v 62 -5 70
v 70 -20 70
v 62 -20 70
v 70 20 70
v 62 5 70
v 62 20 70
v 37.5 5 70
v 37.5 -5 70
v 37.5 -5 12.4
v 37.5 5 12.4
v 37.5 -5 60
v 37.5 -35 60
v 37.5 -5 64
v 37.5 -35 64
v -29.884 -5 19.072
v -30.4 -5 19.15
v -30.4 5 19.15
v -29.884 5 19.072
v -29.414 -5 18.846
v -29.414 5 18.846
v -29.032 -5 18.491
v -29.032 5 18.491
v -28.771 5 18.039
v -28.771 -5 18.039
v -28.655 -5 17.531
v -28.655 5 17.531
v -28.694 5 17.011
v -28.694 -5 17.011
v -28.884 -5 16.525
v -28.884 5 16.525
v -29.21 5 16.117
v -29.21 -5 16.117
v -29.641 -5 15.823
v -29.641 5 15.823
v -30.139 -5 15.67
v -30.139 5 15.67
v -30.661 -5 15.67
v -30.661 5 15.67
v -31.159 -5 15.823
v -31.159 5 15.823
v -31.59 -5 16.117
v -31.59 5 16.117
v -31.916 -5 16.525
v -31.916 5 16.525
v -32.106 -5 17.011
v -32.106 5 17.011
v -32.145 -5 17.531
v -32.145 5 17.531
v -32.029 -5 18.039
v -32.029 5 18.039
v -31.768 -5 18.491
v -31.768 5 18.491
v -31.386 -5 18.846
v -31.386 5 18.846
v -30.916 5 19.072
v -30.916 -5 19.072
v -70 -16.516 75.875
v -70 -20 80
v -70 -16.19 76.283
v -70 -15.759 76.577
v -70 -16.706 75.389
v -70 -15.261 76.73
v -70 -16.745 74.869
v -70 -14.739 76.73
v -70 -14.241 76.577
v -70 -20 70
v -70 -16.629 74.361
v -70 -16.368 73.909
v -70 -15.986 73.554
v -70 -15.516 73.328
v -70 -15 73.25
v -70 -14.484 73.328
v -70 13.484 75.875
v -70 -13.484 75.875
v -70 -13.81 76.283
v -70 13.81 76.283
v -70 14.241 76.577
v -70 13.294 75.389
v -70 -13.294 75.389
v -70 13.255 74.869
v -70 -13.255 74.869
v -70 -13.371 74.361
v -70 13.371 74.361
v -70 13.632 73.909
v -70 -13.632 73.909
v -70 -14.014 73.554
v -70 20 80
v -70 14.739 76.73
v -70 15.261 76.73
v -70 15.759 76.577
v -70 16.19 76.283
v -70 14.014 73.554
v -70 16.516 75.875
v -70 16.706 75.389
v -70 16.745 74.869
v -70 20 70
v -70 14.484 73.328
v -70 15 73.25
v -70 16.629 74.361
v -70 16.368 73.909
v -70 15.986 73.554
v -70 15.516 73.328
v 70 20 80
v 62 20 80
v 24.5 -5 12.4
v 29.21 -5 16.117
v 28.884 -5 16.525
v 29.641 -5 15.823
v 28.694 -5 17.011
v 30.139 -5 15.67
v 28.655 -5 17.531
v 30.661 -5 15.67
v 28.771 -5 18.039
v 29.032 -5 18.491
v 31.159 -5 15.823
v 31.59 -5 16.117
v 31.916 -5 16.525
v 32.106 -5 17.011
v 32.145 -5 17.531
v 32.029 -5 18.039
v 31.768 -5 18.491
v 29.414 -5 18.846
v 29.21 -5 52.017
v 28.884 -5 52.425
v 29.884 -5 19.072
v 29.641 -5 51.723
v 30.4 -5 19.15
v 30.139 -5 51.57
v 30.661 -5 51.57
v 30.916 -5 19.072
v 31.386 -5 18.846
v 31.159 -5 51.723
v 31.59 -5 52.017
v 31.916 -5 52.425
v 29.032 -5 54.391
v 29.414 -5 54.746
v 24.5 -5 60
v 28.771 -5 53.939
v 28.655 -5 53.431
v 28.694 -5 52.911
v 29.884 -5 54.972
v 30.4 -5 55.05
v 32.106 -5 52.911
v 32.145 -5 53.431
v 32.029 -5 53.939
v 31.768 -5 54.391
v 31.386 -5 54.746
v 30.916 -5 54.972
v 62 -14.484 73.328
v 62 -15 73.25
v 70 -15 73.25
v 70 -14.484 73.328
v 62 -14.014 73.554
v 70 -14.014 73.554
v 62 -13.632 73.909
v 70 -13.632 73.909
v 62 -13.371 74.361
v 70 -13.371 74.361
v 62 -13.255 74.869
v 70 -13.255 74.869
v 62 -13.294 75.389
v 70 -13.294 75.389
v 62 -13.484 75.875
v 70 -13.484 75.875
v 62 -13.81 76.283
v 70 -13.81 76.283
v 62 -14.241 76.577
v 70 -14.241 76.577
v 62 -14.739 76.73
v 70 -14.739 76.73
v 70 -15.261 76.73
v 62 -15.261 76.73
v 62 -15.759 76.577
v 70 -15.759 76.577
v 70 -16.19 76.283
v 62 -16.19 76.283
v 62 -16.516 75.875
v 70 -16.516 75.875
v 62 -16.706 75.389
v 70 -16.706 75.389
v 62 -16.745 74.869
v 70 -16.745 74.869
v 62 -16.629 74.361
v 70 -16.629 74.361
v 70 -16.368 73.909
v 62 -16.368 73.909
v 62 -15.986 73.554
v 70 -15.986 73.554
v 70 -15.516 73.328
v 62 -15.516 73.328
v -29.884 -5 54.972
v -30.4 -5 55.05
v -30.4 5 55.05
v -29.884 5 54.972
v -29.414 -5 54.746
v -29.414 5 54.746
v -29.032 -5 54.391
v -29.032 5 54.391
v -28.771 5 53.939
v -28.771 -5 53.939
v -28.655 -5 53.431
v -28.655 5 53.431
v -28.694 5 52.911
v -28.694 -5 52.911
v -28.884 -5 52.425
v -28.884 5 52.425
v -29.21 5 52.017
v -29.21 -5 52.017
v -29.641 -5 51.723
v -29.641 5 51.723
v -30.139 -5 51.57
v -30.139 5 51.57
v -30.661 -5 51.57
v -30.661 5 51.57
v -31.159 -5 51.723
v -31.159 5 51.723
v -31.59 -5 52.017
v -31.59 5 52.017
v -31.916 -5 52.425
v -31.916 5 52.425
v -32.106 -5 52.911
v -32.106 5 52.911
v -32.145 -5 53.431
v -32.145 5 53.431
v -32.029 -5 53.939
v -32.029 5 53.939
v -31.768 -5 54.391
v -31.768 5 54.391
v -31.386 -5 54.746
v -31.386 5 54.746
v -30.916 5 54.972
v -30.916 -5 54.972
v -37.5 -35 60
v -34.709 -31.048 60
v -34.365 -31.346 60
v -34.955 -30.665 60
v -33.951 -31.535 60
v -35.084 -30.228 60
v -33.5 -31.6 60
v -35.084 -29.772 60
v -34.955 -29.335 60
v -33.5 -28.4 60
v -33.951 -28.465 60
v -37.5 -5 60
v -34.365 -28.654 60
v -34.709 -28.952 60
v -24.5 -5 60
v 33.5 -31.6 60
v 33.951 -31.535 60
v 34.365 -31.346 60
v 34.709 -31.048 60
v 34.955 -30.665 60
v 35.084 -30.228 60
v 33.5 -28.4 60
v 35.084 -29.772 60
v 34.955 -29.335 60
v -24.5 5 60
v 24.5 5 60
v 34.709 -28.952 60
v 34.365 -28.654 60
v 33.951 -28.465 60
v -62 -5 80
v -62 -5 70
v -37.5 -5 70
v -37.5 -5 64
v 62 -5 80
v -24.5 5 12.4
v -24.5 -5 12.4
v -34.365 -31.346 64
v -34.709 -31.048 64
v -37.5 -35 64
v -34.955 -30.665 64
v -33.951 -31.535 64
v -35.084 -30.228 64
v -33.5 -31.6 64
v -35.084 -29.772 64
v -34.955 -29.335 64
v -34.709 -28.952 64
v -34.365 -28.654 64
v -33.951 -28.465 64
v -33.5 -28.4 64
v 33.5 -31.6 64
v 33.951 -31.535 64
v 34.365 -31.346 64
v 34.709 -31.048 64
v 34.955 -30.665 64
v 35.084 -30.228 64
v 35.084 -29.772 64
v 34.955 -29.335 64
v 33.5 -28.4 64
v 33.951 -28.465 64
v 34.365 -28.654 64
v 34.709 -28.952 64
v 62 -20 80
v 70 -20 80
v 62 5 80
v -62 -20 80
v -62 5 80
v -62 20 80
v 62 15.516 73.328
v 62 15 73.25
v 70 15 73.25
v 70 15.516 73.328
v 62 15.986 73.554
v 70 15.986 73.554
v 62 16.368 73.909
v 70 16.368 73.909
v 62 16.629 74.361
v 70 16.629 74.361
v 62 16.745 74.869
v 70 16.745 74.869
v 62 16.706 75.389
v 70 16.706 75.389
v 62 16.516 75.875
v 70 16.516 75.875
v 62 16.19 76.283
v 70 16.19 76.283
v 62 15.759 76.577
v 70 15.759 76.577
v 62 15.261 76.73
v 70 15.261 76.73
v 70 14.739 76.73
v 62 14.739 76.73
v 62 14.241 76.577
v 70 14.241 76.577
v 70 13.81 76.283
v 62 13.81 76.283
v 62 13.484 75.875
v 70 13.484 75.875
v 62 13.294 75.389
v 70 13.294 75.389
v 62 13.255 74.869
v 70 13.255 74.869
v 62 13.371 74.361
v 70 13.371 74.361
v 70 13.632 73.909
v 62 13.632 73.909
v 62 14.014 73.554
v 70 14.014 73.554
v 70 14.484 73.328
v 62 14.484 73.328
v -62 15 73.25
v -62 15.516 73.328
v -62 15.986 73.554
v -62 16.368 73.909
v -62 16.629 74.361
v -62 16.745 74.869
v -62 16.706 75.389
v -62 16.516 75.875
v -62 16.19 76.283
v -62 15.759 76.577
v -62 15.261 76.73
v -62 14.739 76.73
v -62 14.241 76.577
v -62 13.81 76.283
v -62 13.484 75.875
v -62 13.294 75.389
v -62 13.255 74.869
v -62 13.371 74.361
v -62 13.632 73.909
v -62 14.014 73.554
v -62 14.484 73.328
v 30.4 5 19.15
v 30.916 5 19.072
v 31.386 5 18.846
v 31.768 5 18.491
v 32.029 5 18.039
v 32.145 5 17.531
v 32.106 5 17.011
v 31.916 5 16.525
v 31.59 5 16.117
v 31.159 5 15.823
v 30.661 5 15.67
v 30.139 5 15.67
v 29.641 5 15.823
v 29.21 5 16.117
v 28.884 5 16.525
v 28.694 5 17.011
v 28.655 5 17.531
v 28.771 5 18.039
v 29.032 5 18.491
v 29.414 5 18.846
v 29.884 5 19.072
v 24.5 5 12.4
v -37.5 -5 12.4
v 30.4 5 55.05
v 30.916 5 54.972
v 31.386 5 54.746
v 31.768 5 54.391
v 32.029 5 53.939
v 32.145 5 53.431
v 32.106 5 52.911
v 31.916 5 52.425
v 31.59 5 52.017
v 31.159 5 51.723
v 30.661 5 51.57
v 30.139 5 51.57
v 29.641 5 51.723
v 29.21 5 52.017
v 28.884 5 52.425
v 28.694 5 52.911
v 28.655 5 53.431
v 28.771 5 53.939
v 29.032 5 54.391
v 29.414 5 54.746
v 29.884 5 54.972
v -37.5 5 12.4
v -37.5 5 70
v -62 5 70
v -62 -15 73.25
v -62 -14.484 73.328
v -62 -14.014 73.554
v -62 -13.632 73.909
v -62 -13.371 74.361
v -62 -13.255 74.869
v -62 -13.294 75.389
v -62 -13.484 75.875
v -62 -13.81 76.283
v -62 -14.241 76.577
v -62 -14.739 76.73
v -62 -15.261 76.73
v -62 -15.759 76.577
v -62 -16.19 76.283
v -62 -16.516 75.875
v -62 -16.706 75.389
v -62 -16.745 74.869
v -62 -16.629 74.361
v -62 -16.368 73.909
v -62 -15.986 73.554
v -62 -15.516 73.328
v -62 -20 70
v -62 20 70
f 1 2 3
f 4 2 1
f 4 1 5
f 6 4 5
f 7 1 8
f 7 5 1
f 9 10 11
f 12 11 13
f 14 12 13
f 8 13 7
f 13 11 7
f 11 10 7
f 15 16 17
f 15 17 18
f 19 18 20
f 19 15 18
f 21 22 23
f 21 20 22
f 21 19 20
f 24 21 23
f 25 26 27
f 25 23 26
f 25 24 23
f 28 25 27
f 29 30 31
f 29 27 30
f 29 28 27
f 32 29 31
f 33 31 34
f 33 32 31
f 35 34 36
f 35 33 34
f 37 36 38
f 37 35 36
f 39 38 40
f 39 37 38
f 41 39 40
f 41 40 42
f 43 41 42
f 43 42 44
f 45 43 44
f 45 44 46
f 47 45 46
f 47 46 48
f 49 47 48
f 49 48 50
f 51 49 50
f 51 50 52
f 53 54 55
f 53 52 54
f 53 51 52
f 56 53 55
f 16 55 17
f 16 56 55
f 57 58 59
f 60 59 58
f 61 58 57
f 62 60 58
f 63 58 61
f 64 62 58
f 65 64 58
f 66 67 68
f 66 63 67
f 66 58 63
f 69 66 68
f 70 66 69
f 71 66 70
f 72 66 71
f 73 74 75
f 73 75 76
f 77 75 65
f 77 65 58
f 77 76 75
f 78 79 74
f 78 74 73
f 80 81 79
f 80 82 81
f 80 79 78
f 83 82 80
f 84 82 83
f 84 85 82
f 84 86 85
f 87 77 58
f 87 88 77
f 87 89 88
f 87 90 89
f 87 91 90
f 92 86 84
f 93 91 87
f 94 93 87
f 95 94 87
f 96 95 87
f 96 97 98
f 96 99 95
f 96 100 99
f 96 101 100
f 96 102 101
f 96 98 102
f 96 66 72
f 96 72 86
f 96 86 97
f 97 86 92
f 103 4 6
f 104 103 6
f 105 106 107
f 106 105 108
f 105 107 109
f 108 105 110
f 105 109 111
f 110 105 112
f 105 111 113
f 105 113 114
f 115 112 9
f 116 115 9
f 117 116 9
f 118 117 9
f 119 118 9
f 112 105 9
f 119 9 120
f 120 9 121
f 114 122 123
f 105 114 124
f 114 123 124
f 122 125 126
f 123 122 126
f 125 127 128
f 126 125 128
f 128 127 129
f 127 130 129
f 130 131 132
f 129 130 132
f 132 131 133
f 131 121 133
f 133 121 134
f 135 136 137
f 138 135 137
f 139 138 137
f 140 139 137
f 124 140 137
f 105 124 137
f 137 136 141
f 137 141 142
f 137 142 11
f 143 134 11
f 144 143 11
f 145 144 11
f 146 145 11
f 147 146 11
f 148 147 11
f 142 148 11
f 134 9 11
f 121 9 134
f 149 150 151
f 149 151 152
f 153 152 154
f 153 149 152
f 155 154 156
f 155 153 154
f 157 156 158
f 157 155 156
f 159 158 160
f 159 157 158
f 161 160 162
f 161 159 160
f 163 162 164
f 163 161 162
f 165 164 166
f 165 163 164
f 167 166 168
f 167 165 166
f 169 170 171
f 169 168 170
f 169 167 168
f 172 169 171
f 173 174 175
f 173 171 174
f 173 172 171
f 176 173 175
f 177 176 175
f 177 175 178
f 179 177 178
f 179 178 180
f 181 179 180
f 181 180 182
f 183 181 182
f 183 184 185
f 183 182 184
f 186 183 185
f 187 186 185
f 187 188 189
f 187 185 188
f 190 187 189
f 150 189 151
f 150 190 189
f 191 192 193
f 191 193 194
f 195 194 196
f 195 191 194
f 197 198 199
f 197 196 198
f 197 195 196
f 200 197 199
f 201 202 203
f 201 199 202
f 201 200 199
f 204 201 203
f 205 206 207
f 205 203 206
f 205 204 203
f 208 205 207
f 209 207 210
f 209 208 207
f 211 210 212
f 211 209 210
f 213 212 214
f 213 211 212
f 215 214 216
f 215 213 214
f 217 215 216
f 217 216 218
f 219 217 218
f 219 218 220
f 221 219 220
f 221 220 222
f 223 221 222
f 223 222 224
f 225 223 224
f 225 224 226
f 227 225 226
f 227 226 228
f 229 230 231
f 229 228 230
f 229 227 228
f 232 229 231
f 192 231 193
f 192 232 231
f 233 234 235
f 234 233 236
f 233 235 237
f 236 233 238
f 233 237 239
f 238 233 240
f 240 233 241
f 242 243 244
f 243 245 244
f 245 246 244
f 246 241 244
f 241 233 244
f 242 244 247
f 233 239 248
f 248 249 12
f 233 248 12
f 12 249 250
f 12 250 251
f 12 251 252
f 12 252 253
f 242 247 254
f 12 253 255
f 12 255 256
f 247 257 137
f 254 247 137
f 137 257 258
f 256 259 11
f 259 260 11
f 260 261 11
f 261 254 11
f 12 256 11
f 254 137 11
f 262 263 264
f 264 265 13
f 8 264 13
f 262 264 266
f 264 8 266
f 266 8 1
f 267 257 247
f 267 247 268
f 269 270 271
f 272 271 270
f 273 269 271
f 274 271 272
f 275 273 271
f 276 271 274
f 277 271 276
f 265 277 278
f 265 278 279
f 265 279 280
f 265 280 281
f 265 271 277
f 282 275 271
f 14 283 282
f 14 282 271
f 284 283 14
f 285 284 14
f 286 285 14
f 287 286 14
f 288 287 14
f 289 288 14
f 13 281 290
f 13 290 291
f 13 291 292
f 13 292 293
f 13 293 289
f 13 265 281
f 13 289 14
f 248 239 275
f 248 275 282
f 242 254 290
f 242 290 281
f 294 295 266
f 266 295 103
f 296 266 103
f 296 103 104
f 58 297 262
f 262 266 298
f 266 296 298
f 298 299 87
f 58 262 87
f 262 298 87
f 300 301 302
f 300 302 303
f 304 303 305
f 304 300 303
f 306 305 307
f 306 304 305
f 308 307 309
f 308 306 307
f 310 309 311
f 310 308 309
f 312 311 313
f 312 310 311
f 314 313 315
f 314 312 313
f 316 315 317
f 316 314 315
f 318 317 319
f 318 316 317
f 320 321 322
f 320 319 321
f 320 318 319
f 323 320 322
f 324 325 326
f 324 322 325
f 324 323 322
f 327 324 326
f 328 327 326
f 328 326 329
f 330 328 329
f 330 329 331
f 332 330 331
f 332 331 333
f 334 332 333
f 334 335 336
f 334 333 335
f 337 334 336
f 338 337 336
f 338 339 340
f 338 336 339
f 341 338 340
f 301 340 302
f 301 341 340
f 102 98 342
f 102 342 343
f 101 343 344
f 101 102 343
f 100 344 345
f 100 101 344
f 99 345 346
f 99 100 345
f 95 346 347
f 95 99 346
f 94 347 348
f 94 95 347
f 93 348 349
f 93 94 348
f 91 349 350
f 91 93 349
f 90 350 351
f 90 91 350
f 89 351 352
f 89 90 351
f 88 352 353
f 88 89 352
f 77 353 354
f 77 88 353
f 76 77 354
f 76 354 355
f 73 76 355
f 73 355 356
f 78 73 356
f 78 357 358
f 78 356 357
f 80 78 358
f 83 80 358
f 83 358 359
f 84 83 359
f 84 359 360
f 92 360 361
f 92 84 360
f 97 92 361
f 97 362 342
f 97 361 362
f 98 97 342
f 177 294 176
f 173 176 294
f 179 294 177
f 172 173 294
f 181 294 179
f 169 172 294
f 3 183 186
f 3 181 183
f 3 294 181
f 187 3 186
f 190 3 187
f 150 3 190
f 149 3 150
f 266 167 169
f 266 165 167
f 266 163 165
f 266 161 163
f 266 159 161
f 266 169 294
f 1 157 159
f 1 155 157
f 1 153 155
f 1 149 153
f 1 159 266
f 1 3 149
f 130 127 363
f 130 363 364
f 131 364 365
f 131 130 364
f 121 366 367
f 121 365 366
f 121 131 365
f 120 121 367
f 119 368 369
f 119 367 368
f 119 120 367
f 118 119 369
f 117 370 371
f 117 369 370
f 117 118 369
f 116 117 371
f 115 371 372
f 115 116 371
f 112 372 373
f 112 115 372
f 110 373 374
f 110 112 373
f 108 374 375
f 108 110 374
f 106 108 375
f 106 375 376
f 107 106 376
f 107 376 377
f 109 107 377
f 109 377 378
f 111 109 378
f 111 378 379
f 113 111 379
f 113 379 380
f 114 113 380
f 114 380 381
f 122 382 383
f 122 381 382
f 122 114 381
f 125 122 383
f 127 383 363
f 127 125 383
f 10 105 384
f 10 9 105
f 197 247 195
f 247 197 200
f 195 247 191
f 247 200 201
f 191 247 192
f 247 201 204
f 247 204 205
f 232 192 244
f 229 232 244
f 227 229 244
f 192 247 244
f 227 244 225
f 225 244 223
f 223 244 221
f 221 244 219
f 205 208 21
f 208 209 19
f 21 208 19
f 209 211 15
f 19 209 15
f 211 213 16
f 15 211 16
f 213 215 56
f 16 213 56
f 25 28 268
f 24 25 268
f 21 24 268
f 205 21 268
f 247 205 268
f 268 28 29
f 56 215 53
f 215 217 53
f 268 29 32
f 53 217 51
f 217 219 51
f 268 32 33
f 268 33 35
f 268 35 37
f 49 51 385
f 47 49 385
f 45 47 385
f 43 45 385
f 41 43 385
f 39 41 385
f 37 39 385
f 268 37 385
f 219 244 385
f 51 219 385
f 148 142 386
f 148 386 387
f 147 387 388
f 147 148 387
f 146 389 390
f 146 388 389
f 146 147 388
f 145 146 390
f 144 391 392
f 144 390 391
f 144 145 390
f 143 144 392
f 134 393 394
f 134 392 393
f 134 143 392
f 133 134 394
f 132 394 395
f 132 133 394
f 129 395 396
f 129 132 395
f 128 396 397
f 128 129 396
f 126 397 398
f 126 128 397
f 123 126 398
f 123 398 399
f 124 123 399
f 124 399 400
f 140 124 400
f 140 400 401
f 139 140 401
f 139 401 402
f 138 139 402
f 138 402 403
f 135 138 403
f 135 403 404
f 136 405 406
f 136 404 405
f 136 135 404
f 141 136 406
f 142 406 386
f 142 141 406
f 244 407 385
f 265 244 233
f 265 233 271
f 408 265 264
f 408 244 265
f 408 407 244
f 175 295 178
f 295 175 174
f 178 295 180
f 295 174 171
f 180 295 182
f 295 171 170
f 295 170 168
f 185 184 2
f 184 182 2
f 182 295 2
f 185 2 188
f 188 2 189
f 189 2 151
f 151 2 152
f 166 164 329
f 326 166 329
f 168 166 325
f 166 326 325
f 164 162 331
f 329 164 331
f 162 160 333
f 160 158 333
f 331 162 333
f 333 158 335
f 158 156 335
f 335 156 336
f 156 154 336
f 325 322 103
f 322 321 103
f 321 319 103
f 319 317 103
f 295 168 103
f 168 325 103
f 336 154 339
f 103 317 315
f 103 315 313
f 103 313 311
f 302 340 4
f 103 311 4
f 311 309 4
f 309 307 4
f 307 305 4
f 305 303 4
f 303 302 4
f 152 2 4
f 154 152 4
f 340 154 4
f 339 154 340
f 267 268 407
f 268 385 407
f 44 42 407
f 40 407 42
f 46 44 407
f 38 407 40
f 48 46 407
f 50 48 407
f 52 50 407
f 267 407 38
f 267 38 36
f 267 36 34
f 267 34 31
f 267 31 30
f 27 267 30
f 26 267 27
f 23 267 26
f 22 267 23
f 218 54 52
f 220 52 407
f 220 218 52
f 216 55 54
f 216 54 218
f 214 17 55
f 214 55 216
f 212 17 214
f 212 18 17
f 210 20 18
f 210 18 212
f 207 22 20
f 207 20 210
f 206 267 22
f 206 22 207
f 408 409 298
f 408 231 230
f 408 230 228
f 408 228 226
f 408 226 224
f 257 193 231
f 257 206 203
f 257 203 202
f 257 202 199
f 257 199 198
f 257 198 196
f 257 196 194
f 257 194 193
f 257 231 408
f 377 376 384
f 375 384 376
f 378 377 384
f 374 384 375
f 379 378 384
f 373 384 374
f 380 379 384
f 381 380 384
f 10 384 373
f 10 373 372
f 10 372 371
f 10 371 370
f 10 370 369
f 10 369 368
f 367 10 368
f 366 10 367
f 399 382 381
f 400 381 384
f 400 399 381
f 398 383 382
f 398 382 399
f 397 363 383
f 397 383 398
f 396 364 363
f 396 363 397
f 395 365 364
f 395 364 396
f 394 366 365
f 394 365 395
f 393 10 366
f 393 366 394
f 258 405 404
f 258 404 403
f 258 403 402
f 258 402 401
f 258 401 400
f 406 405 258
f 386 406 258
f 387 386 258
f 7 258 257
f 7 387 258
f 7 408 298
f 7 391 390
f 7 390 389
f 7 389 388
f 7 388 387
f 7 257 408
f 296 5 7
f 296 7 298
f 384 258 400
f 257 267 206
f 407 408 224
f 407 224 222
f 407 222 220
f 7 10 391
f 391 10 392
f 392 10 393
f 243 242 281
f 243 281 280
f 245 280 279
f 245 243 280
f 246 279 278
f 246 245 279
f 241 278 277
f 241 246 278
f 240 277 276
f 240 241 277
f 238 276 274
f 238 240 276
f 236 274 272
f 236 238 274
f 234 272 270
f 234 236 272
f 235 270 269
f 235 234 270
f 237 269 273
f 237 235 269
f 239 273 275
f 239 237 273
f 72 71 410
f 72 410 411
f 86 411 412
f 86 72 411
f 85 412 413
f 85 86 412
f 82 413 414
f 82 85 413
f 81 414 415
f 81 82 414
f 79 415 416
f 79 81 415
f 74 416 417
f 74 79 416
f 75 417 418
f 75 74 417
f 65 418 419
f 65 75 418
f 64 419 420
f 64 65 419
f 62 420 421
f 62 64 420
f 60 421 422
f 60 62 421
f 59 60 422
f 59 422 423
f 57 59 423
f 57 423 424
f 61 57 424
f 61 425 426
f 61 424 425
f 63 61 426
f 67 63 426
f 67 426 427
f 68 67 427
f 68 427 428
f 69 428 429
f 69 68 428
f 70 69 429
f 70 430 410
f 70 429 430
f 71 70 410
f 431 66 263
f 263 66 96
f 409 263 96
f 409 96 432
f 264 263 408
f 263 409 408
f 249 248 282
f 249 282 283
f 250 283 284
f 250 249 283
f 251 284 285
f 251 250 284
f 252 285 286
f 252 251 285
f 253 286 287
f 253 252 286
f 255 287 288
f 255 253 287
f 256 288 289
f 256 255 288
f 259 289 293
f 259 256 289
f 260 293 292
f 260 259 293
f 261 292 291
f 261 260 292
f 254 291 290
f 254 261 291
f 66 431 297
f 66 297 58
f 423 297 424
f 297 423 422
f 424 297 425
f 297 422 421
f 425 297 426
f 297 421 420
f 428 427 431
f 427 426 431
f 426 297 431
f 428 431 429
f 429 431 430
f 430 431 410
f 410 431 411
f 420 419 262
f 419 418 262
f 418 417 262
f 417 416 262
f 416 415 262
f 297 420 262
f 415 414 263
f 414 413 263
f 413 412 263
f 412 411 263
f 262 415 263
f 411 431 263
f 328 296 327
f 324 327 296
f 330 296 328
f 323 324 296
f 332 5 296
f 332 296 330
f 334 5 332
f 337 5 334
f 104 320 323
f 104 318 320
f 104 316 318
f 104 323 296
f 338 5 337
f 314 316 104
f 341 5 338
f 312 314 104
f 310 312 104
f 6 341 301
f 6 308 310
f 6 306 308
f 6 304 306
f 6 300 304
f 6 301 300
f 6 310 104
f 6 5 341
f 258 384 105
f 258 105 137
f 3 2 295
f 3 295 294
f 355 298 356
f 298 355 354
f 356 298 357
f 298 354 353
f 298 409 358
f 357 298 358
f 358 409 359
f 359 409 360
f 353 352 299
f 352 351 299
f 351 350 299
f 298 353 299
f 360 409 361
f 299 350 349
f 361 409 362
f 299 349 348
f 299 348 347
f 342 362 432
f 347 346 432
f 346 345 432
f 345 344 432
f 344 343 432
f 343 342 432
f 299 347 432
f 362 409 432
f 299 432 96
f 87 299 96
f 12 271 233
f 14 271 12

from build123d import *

# Parameters (mm, degrees)
SKETCH_1_W               = 140
SKETCH_1_H               = 10
EXTRUDE_1_DEPTH          = 80
SKETCH_2_W               = 32.5
SKETCH_2_H               = 70
CUT_EXTRUDE_1_DEPTH      = 107.77078252
SKETCH_4_W               = 55
SKETCH_4_H               = 10
CUT_EXTRUDE_2_DEPTH      = 60
SKETCH_5_W               = 8
SKETCH_5_H               = 40
EXTRUDE_2_DEPTH          = 10
CUT_EXTRUDE_START        = -12.4
SKETCH_6_W               = 10
SKETCH_6_H               = 10
CUT_EXTRUDE_3_DEPTH      = 12.4
SKETCH_7_W               = 75
SKETCH_7_H               = 4
EXTRUDE_3_DEPTH          = 30
CUT_EXTRUDE_4_DEPTH      = 27
CUT_EXTRUDE_5_DEPTH      = 159.268758762
CUT_EXTRUDE_5_DEPTH_BACK = 159.268758762
SKETCH_9_R               = 1.75
CUT_EXTRUDE_6_DEPTH      = 114.578166916
CUT_EXTRUDE_6_DEPTH_BACK = 114.578166916
SKETCH_10_R              = 1.75
SKETCH_11_W              = 47.6
SKETCH_11_H              = 10
EXTRUDE_4_DEPTH          = 3
SKETCH_12_W              = 47.6
SKETCH_12_H              = 10
EXTRUDE_5_DEPTH          = 3


with BuildPart() as part:
    # 草图1 → 凸台-拉伸1 (new body)
    with BuildSketch(Plane.XY):
        Rectangle(SKETCH_1_W, SKETCH_1_H)
    extrude(amount=EXTRUDE_1_DEPTH)

    # 草图2 → 切除-拉伸1 (cut, through all)
    with BuildSketch(Plane(origin=(0, 5, 0), x_dir=(1, 0, 0), z_dir=(0, 1, 0))):
        with Locations((-53.75, -35)):
            Rectangle(SKETCH_2_W, SKETCH_2_H)
        with Locations((53.75, -35)):
            Rectangle(SKETCH_2_W, SKETCH_2_H)
    extrude(amount=-CUT_EXTRUDE_1_DEPTH, mode=Mode.SUBTRACT)

    # 草图4 → 切除-拉伸2 (cut)
    with BuildSketch(Plane(origin=(0, 0, 0), x_dir=(-1, 0, 0), z_dir=(0, 0, -1))):
        Rectangle(SKETCH_4_W, SKETCH_4_H)
    extrude(amount=-CUT_EXTRUDE_2_DEPTH, mode=Mode.SUBTRACT)

    # 草图5 → 凸台-拉伸2 (add)
    with BuildSketch(Plane(origin=(0, 0, 70), x_dir=(-1, 0, 0), z_dir=(0, 0, -1))):
        with Locations((-66, 0)):
            Rectangle(SKETCH_5_W, SKETCH_5_H)
        with Locations((66, 0)):
            Rectangle(SKETCH_5_W, SKETCH_5_H)
    extrude(amount=-EXTRUDE_2_DEPTH)

    # 草图6 → 切除-拉伸3 (cut)
    with BuildSketch(Plane(origin=(0, 0, 0), x_dir=(-1, 0, 0), z_dir=(0, 0, -1)).offset(CUT_EXTRUDE_START)):
        with Locations((32.5, 0)):
            Rectangle(SKETCH_6_W, SKETCH_6_H)
        with Locations((-32.5, 0)):
            Rectangle(SKETCH_6_W, SKETCH_6_H)
    extrude(amount=CUT_EXTRUDE_3_DEPTH, mode=Mode.SUBTRACT)

    # 草图7 → 凸台-拉伸3 (add)
    with BuildSketch(Plane.XZ.offset(5)):
        with Locations((0, 62)):
            Rectangle(SKETCH_7_W, SKETCH_7_H)
    extrude(amount=EXTRUDE_3_DEPTH)

    # 草图8 → 切除-拉伸4 (cut)
    with BuildSketch(Plane(origin=(0, 0, 60), x_dir=(-1, 0, 0), z_dir=(0, 0, -1))):
        with BuildLine():
            Line((-33.5, -28.4), (33.5, -28.4))
            ThreePointArc((33.5, -28.4), (35.1, -30), (33.5, -31.6))
            Line((33.5, -31.6), (-33.5, -31.6))
            ThreePointArc((-33.5, -31.6), (-35.1, -30), (-33.5, -28.4))
        make_face()
    extrude(amount=-CUT_EXTRUDE_4_DEPTH, mode=Mode.SUBTRACT)

    # 草图9 → 切除-拉伸5 (cut, two sides: drawn at the far end of the back side and taken through both)
    with BuildSketch(Plane(origin=(-62, 0, 0), x_dir=(0, 0, -1), z_dir=(1, 0, 0)).offset(-CUT_EXTRUDE_5_DEPTH_BACK)):
        with Locations((-75, 15)):
            Circle(SKETCH_9_R)
        with Locations((-75, -15)):
            Circle(SKETCH_9_R)
    extrude(amount=CUT_EXTRUDE_5_DEPTH + CUT_EXTRUDE_5_DEPTH_BACK, mode=Mode.SUBTRACT)

    # 草图10 → 切除-拉伸6 (cut, two sides: drawn at the far end of the back side and taken through both)
    with BuildSketch(Plane(origin=(0, 5, 0), x_dir=(1, 0, 0), z_dir=(0, 1, 0)).offset(-CUT_EXTRUDE_6_DEPTH_BACK)):
        with Locations(Location((30.4, -53.3, 0), (0, 0, 270))):
            Circle(SKETCH_10_R)
        with Locations(Location((30.4, -17.4, 0), (0, 0, 270))):
            Circle(SKETCH_10_R)
        with Locations(Location((-30.4, -17.4, 0), (0, 0, 270))):
            Circle(SKETCH_10_R)
        with Locations(Location((-30.4, -53.3, 0), (0, 0, 270))):
            Circle(SKETCH_10_R)
    extrude(amount=CUT_EXTRUDE_6_DEPTH + CUT_EXTRUDE_6_DEPTH_BACK, mode=Mode.SUBTRACT)

    # 草图11 → 凸台-拉伸4 (add)
    with BuildSketch(Plane.ZY.offset(-27.5)):
        with Locations((36.2, 0)):
            Rectangle(SKETCH_11_W, SKETCH_11_H)
    extrude(amount=EXTRUDE_4_DEPTH)

    # 草图12 → 凸台-拉伸5 (add)
    with BuildSketch(Plane(origin=(-27.5, 0, 0), x_dir=(0, 0, -1), z_dir=(1, 0, 0))):
        with Locations((-36.2, 0)):
            Rectangle(SKETCH_12_W, SKETCH_12_H)
    extrude(amount=EXTRUDE_5_DEPTH)


solid = part.part
